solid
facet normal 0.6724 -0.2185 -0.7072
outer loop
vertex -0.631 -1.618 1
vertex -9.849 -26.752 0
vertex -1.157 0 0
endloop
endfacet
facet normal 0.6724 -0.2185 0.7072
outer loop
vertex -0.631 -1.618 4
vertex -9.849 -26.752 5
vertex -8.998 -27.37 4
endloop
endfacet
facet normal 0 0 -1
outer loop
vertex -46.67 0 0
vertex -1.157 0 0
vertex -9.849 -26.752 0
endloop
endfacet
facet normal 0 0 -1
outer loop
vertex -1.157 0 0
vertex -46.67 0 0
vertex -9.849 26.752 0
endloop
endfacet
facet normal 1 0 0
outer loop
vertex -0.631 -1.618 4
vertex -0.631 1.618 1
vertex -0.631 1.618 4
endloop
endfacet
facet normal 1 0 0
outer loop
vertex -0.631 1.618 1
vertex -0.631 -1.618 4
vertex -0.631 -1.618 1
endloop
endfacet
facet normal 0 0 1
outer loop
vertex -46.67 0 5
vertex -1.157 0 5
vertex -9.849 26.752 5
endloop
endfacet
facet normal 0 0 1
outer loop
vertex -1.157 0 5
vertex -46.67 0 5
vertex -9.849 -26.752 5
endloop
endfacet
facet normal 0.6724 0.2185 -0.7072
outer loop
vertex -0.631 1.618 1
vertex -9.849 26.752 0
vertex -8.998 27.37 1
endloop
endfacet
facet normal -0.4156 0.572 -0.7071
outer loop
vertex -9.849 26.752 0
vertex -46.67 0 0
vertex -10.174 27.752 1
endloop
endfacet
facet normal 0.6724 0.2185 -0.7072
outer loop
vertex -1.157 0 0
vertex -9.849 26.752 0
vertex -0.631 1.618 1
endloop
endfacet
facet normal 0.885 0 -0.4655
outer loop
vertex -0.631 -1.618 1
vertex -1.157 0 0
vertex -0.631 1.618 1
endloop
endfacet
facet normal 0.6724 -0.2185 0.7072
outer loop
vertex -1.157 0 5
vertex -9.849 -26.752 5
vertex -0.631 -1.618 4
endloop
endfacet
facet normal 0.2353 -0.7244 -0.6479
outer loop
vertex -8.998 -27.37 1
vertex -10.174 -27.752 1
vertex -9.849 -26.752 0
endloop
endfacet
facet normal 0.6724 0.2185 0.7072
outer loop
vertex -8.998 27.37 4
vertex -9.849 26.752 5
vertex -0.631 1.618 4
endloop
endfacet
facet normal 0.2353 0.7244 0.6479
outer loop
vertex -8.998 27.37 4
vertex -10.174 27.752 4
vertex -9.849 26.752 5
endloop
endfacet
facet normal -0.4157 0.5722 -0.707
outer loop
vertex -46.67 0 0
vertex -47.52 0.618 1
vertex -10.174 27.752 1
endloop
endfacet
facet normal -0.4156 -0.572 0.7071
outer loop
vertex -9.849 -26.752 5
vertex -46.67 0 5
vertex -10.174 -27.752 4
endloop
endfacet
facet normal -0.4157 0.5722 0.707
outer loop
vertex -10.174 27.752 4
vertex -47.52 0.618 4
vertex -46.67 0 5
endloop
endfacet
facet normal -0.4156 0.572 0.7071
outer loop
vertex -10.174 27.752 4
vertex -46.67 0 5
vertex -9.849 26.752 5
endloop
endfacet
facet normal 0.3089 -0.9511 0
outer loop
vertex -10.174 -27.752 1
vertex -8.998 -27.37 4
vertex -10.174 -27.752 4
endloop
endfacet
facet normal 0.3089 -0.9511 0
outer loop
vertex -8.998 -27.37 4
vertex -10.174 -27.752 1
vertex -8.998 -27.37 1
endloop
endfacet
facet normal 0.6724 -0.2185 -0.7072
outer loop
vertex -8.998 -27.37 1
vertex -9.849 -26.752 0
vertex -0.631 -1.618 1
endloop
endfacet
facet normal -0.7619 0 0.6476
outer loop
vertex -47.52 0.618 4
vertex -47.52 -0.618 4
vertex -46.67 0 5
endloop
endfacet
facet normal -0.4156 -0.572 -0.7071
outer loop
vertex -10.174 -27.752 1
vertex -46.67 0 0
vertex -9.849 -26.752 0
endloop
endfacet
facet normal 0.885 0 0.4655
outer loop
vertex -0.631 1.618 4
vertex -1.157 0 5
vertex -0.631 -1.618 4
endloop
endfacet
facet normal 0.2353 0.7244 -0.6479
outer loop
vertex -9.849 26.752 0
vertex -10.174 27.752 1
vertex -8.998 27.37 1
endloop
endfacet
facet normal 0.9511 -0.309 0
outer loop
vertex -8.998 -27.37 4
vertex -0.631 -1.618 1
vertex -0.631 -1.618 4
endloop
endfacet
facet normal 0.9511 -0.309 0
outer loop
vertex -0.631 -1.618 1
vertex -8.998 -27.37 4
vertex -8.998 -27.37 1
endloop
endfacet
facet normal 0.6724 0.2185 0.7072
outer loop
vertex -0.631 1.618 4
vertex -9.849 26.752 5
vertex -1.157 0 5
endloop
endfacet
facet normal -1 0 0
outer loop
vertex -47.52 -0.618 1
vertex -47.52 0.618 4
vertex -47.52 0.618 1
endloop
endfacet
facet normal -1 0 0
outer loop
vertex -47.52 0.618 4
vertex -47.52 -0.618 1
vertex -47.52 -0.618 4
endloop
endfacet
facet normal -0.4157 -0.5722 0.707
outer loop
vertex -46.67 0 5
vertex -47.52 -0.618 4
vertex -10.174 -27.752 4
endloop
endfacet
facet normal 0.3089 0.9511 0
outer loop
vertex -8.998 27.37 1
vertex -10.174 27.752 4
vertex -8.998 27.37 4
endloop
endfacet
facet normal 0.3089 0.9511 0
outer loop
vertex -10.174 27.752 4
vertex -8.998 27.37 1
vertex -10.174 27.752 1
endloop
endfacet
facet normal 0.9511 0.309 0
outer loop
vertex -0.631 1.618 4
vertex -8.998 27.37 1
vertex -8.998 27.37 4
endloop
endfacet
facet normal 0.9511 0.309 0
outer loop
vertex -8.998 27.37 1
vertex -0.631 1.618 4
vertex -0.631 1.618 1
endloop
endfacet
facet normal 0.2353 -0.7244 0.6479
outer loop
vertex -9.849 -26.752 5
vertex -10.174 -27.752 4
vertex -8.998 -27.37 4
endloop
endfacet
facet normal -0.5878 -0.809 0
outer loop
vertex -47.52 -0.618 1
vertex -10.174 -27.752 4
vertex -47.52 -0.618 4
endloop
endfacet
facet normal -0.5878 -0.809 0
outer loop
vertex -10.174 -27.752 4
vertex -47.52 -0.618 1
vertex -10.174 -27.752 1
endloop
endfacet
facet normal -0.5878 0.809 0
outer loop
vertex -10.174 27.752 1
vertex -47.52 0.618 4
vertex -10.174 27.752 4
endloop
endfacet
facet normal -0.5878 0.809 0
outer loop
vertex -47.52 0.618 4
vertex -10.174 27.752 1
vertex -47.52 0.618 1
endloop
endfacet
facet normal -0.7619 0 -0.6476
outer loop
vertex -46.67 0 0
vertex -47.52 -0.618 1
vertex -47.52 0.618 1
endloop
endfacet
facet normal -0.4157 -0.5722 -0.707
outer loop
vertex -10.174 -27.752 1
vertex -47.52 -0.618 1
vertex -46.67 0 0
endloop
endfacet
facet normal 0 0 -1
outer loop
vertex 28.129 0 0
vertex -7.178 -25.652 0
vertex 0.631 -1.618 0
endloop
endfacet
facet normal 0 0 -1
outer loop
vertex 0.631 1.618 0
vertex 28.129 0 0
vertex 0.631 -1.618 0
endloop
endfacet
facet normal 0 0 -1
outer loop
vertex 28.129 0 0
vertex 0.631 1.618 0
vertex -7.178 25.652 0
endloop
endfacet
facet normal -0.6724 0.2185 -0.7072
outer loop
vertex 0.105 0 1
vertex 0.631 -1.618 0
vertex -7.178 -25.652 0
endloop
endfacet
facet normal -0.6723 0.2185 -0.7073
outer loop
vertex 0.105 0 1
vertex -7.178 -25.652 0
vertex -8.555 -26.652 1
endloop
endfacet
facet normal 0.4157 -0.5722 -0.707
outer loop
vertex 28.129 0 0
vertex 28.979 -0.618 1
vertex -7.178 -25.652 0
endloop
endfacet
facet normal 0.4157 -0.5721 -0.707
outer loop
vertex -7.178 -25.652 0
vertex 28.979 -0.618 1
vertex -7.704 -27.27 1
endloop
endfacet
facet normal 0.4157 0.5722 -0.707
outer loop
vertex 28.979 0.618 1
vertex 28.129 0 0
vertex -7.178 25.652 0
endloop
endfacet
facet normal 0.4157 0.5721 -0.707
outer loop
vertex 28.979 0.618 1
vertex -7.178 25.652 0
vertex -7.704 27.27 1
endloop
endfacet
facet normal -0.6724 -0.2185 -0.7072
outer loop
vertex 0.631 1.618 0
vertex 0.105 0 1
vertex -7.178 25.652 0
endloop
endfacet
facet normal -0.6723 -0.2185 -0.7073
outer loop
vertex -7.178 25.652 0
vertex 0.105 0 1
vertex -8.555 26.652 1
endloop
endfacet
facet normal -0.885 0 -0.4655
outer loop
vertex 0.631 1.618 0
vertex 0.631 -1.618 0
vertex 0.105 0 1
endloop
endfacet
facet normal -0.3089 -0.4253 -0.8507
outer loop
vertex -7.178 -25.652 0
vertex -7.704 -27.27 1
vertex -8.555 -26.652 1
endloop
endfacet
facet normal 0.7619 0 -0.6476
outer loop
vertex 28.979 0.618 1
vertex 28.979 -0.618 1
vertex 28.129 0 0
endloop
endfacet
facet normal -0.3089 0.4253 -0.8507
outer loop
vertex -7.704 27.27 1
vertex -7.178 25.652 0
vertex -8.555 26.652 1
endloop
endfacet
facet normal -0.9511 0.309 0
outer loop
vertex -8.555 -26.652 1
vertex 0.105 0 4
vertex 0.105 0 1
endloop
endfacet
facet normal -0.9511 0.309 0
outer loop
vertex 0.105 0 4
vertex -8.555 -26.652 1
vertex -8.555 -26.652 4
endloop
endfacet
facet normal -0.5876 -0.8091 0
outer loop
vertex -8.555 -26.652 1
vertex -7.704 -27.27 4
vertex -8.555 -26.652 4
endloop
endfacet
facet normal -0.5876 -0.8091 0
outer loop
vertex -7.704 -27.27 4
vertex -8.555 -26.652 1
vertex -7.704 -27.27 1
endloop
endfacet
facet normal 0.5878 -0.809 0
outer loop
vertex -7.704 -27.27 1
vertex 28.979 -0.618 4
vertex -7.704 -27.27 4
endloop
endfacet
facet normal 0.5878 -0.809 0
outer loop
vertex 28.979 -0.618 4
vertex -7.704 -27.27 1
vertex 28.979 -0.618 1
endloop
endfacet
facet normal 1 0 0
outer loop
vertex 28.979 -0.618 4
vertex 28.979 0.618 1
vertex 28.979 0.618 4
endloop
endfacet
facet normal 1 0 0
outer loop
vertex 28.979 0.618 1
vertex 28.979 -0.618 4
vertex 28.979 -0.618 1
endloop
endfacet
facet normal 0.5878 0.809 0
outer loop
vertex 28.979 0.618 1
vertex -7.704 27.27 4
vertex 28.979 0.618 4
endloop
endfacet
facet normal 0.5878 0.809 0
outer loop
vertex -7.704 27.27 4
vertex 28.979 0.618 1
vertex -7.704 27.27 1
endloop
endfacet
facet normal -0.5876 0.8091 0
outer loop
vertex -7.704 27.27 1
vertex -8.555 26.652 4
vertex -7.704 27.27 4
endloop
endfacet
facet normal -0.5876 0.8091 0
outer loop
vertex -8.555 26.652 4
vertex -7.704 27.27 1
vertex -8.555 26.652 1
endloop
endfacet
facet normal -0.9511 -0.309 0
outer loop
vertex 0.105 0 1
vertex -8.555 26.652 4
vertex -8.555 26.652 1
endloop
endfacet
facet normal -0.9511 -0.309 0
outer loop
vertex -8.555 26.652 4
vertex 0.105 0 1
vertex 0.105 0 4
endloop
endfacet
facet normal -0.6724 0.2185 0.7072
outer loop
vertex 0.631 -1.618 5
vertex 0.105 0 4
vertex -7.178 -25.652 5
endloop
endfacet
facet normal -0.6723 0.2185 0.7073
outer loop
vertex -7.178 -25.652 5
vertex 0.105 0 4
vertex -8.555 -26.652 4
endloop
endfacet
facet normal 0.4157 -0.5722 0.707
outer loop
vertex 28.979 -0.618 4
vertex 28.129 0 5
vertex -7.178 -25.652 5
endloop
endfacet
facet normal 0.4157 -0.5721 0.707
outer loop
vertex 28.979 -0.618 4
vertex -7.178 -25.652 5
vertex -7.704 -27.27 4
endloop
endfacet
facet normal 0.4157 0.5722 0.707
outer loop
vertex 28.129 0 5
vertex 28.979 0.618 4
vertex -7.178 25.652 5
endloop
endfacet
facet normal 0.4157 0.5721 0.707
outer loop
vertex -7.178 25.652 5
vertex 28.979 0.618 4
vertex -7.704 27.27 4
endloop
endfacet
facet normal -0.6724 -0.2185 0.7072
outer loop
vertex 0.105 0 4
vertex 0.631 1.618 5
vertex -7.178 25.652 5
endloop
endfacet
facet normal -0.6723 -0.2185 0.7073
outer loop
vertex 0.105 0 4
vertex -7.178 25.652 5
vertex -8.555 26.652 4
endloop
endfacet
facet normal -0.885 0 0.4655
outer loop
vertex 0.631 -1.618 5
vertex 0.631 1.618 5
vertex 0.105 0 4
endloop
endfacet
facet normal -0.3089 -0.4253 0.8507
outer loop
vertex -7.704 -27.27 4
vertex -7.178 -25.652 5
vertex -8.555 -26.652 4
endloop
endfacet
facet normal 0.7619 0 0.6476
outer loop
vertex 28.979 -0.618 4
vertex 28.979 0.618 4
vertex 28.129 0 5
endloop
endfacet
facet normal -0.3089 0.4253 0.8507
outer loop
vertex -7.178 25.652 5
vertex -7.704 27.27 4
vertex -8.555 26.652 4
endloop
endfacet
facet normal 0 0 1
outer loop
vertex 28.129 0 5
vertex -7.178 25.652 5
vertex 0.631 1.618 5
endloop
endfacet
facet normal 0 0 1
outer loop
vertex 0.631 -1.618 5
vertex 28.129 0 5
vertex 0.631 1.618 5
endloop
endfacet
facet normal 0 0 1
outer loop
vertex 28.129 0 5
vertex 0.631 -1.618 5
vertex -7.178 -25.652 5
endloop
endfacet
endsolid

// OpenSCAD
// file: ../functions/vectors2D.scad
/* * * * * * * * * * * * * * * * * * * * * * * * * * * * * * * * * * * * *\
 * Copyright (C) Claus Schrammel <claus@f05fk.net>                       *
 *                                                                       *
 * This program is free software: you can redistribute it and/or modify  *
 * it under the terms of the GNU General Public License as published by  *
 * the Free Software Foundation, either version 3 of the License, or     *
 * (at your option) any later version.                                   *
 *                                                                       *
 * This program is distributed in the hope that it will be useful,       *
 * but WITHOUT ANY WARRANTY; without even the implied warranty of        *
 * MERCHANTABILITY or FITNESS FOR A PARTICULAR PURPOSE.  See the         *
 * GNU General Public License for more details.                          *
 *                                                                       *
 * You should have received a copy of the GNU General Public License     *
 * along with this program.  If not, see <http://www.gnu.org/licenses/>. *
 *                                                                       *
 * SPDX-License-Identifier: GPL-3.0-or-later                             *
\* * * * * * * * * * * * * * * * * * * * * * * * * * * * * * * * * * * * */

include <utils.scad>

function normal_vector_2D(vector) = [-vector.y, vector.x];
function unit_vector_2D(vector) = vector / norm(vector);

/*
 * Calculates the coefficient for v1 to get from p1 to the intersection point of the two lines p1/v1 and p2/v2:
 * intersection_point = p1 + v1 * intersection_coefficient1.
 */
function intersection_coefficient1(p1, v1, p2, v2) = ( v2.x * (p1.y - p2.y) - v2.y * (p1.x - p2.x) ) / (v1.x * v2.y - v1.y * v2.x);

/*
 * Calculates the coefficient for v2 to get from p2 to the intersection point of the two lines p1/v1 and p2/v2:
 * intersection_point = p2 + v2 * intersection_coefficient2.
 */
function intersection_coefficient2(p1, v1, p2, v2) = intersection_coefficient1(p2, v2, p1, v1);

/*
 * Calculates the intersection point of the two lines p1/v1 and p2/v2.
 */
function intersection_point(p1, v1, p2, v2) = p1 + v1 * intersection_coefficient1(p1, v1, p2, v2);
// file: ../functions/utils.scad
/* * * * * * * * * * * * * * * * * * * * * * * * * * * * * * * * * * * * *\
 * Copyright (C) Claus Schrammel <claus@f05fk.net>                       *
 *                                                                       *
 * This program is free software: you can redistribute it and/or modify  *
 * it under the terms of the GNU General Public License as published by  *
 * the Free Software Foundation, either version 3 of the License, or     *
 * (at your option) any later version.                                   *
 *                                                                       *
 * This program is distributed in the hope that it will be useful,       *
 * but WITHOUT ANY WARRANTY; without even the implied warranty of        *
 * MERCHANTABILITY or FITNESS FOR A PARTICULAR PURPOSE.  See the         *
 * GNU General Public License for more details.                          *
 *                                                                       *
 * You should have received a copy of the GNU General Public License     *
 * along with this program.  If not, see <http://www.gnu.org/licenses/>. *
 *                                                                       *
 * SPDX-License-Identifier: GPL-3.0-or-later                             *
\* * * * * * * * * * * * * * * * * * * * * * * * * * * * * * * * * * * * */

// the modulo operator % creates negative results for negative inputs n
function modulo(n, m) = ((n % m) + m) % m;

function cyclic_array(array, index) = array[modulo(index, len(array))];
// file: ../functions/polygons.scad
/* * * * * * * * * * * * * * * * * * * * * * * * * * * * * * * * * * * * *\
 * Copyright (C) Claus Schrammel <claus@f05fk.net>                       *
 *                                                                       *
 * This program is free software: you can redistribute it and/or modify  *
 * it under the terms of the GNU General Public License as published by  *
 * the Free Software Foundation, either version 3 of the License, or     *
 * (at your option) any later version.                                   *
 *                                                                       *
 * This program is distributed in the hope that it will be useful,       *
 * but WITHOUT ANY WARRANTY; without even the implied warranty of        *
 * MERCHANTABILITY or FITNESS FOR A PARTICULAR PURPOSE.  See the         *
 * GNU General Public License for more details.                          *
 *                                                                       *
 * You should have received a copy of the GNU General Public License     *
 * along with this program.  If not, see <http://www.gnu.org/licenses/>. *
 *                                                                       *
 * SPDX-License-Identifier: GPL-3.0-or-later                             *
\* * * * * * * * * * * * * * * * * * * * * * * * * * * * * * * * * * * * */

include <utils.scad>
include <vectors2D.scad>

/*
 * Shrinks the polygon by moving the edges "inwards" by the given distance.
 * The points need to be given in the counter-clockwise order, i.e. applying the
 * right-hand rule with the thumb pointing in the z direction.
 */
function shrink_edges(points, distance) =
    [ for (i = [0 : 1 : len(points) - 1])
        let (p1 = cyclic_array(points, i - 1), p2 = cyclic_array(points, i), p3 = cyclic_array(points, i + 1),
                v1 = p2 - p1, v2 = p3 - p2,
                n1 = unit_vector_2D(normal_vector_2D(v1)), n2 = unit_vector_2D(normal_vector_2D(v2)))
            intersection_point(p1 + n1 * distance, v1, p2 + n2 * distance, v2)
    ];

/*
 * Grows the polygon by moving the edges "outwards" by the given distance.
 * The points need to be given in the counter-clockwise order, i.e. applying the
 * right-hand rule with the thumb pointing in the z direction.
 */
function grow_edges(points, distance) = shrink_edges(points, -distance);

/*
 * Flattens the corners of the polygon by cutting off at the intersection points where one of the edges
 * is moved "inwards" by the given distance, while the other edge is not, and vice-versa.
 * The points need to be given in the counter-clockwise order, i.e. applying the
 * right-hand rule with the thumb pointing in the z direction.
 */
function flatten_corners(points, distance) = 
    [ for (i = [0 : 1 : len(points) - 1])
        let (p1 = cyclic_array(points, i - 1), p2 = cyclic_array(points, i), p3 = cyclic_array(points, i + 1),
                v1 = p2 - p1, v2 = p3 - p2,
                n1 = unit_vector_2D(normal_vector_2D(v1)), n2 = unit_vector_2D(normal_vector_2D(v2)))
            each [
                intersection_point(p1, v1, p2 + n2 * distance, v2),
                intersection_point(p1 + n1 * distance, v1, p2, v2)
            ]
    ];
// file: ../functions/constants.scad
/* * * * * * * * * * * * * * * * * * * * * * * * * * * * * * * * * * * * *\
 * Copyright (C) Claus Schrammel <claus@f05fk.net>                       *
 *                                                                       *
 * This program is free software: you can redistribute it and/or modify  *
 * it under the terms of the GNU General Public License as published by  *
 * the Free Software Foundation, either version 3 of the License, or     *
 * (at your option) any later version.                                   *
 *                                                                       *
 * This program is distributed in the hope that it will be useful,       *
 * but WITHOUT ANY WARRANTY; without even the implied warranty of        *
 * MERCHANTABILITY or FITNESS FOR A PARTICULAR PURPOSE.  See the         *
 * GNU General Public License for more details.                          *
 *                                                                       *
 * You should have received a copy of the GNU General Public License     *
 * along with this program.  If not, see <http://www.gnu.org/licenses/>. *
 *                                                                       *
 * SPDX-License-Identifier: GPL-3.0-or-later                             *
\* * * * * * * * * * * * * * * * * * * * * * * * * * * * * * * * * * * * */

PHI = (1 + sqrt(5)) / 2;
phi = 1 / PHI;
// main file
/* * * * * * * * * * * * * * * * * * * * * * * * * * * * * * * * * * * * *\
 * Copyright (C) Claus Schrammel <claus@f05fk.net>                       *
 *                                                                       *
 * This program is free software: you can redistribute it and/or modify  *
 * it under the terms of the GNU General Public License as published by  *
 * the Free Software Foundation, either version 3 of the License, or     *
 * (at your option) any later version.                                   *
 *                                                                       *
 * This program is distributed in the hope that it will be useful,       *
 * but WITHOUT ANY WARRANTY; without even the implied warranty of        *
 * MERCHANTABILITY or FITNESS FOR A PARTICULAR PURPOSE.  See the         *
 * GNU General Public License for more details.                          *
 *                                                                       *
 * You should have received a copy of the GNU General Public License     *
 * along with this program.  If not, see <http://www.gnu.org/licenses/>. *
 *                                                                       *
 * SPDX-License-Identifier: GPL-3.0-or-later                             *
\* * * * * * * * * * * * * * * * * * * * * * * * * * * * * * * * * * * * */
$fn = 120;

include <../functions/constants.scad>;
use <../modules/PrismaChamfered.scad>

UNIT = 30;

P2_KITE = [[0,0], [cos(108), sin(108)], [-PHI, 0], [cos(-108), sin(-108)]] * UNIT;
PrismaChamfered(points = shrink_edges(P2_KITE, 0.1), height = 5, chamfer = 1);

P2_DART = [[0,0], [cos(-108), sin(-108)], [1, 0], [cos(108), sin(108)]] * UNIT;
PrismaChamfered(points = shrink_edges(P2_DART, 0.1), height = 5, chamfer = 1);

P3_THIN =  [[0,0], [cos( 108), sin( 108)], [-1/PHI, 0], [cos(-108), sin(-108)]] * UNIT;
*PrismaChamfered(points = shrink_edges(P3_THIN, 0.1), height = 5, chamfer = 1);

P3_THICK = [[0,0], [cos(-36), sin(-36)], [PHI, 0], [cos(36), sin(36)]] * UNIT;
*PrismaChamfered(points = shrink_edges(P3_THICK, 0.1), height = 5, chamfer = 1);
